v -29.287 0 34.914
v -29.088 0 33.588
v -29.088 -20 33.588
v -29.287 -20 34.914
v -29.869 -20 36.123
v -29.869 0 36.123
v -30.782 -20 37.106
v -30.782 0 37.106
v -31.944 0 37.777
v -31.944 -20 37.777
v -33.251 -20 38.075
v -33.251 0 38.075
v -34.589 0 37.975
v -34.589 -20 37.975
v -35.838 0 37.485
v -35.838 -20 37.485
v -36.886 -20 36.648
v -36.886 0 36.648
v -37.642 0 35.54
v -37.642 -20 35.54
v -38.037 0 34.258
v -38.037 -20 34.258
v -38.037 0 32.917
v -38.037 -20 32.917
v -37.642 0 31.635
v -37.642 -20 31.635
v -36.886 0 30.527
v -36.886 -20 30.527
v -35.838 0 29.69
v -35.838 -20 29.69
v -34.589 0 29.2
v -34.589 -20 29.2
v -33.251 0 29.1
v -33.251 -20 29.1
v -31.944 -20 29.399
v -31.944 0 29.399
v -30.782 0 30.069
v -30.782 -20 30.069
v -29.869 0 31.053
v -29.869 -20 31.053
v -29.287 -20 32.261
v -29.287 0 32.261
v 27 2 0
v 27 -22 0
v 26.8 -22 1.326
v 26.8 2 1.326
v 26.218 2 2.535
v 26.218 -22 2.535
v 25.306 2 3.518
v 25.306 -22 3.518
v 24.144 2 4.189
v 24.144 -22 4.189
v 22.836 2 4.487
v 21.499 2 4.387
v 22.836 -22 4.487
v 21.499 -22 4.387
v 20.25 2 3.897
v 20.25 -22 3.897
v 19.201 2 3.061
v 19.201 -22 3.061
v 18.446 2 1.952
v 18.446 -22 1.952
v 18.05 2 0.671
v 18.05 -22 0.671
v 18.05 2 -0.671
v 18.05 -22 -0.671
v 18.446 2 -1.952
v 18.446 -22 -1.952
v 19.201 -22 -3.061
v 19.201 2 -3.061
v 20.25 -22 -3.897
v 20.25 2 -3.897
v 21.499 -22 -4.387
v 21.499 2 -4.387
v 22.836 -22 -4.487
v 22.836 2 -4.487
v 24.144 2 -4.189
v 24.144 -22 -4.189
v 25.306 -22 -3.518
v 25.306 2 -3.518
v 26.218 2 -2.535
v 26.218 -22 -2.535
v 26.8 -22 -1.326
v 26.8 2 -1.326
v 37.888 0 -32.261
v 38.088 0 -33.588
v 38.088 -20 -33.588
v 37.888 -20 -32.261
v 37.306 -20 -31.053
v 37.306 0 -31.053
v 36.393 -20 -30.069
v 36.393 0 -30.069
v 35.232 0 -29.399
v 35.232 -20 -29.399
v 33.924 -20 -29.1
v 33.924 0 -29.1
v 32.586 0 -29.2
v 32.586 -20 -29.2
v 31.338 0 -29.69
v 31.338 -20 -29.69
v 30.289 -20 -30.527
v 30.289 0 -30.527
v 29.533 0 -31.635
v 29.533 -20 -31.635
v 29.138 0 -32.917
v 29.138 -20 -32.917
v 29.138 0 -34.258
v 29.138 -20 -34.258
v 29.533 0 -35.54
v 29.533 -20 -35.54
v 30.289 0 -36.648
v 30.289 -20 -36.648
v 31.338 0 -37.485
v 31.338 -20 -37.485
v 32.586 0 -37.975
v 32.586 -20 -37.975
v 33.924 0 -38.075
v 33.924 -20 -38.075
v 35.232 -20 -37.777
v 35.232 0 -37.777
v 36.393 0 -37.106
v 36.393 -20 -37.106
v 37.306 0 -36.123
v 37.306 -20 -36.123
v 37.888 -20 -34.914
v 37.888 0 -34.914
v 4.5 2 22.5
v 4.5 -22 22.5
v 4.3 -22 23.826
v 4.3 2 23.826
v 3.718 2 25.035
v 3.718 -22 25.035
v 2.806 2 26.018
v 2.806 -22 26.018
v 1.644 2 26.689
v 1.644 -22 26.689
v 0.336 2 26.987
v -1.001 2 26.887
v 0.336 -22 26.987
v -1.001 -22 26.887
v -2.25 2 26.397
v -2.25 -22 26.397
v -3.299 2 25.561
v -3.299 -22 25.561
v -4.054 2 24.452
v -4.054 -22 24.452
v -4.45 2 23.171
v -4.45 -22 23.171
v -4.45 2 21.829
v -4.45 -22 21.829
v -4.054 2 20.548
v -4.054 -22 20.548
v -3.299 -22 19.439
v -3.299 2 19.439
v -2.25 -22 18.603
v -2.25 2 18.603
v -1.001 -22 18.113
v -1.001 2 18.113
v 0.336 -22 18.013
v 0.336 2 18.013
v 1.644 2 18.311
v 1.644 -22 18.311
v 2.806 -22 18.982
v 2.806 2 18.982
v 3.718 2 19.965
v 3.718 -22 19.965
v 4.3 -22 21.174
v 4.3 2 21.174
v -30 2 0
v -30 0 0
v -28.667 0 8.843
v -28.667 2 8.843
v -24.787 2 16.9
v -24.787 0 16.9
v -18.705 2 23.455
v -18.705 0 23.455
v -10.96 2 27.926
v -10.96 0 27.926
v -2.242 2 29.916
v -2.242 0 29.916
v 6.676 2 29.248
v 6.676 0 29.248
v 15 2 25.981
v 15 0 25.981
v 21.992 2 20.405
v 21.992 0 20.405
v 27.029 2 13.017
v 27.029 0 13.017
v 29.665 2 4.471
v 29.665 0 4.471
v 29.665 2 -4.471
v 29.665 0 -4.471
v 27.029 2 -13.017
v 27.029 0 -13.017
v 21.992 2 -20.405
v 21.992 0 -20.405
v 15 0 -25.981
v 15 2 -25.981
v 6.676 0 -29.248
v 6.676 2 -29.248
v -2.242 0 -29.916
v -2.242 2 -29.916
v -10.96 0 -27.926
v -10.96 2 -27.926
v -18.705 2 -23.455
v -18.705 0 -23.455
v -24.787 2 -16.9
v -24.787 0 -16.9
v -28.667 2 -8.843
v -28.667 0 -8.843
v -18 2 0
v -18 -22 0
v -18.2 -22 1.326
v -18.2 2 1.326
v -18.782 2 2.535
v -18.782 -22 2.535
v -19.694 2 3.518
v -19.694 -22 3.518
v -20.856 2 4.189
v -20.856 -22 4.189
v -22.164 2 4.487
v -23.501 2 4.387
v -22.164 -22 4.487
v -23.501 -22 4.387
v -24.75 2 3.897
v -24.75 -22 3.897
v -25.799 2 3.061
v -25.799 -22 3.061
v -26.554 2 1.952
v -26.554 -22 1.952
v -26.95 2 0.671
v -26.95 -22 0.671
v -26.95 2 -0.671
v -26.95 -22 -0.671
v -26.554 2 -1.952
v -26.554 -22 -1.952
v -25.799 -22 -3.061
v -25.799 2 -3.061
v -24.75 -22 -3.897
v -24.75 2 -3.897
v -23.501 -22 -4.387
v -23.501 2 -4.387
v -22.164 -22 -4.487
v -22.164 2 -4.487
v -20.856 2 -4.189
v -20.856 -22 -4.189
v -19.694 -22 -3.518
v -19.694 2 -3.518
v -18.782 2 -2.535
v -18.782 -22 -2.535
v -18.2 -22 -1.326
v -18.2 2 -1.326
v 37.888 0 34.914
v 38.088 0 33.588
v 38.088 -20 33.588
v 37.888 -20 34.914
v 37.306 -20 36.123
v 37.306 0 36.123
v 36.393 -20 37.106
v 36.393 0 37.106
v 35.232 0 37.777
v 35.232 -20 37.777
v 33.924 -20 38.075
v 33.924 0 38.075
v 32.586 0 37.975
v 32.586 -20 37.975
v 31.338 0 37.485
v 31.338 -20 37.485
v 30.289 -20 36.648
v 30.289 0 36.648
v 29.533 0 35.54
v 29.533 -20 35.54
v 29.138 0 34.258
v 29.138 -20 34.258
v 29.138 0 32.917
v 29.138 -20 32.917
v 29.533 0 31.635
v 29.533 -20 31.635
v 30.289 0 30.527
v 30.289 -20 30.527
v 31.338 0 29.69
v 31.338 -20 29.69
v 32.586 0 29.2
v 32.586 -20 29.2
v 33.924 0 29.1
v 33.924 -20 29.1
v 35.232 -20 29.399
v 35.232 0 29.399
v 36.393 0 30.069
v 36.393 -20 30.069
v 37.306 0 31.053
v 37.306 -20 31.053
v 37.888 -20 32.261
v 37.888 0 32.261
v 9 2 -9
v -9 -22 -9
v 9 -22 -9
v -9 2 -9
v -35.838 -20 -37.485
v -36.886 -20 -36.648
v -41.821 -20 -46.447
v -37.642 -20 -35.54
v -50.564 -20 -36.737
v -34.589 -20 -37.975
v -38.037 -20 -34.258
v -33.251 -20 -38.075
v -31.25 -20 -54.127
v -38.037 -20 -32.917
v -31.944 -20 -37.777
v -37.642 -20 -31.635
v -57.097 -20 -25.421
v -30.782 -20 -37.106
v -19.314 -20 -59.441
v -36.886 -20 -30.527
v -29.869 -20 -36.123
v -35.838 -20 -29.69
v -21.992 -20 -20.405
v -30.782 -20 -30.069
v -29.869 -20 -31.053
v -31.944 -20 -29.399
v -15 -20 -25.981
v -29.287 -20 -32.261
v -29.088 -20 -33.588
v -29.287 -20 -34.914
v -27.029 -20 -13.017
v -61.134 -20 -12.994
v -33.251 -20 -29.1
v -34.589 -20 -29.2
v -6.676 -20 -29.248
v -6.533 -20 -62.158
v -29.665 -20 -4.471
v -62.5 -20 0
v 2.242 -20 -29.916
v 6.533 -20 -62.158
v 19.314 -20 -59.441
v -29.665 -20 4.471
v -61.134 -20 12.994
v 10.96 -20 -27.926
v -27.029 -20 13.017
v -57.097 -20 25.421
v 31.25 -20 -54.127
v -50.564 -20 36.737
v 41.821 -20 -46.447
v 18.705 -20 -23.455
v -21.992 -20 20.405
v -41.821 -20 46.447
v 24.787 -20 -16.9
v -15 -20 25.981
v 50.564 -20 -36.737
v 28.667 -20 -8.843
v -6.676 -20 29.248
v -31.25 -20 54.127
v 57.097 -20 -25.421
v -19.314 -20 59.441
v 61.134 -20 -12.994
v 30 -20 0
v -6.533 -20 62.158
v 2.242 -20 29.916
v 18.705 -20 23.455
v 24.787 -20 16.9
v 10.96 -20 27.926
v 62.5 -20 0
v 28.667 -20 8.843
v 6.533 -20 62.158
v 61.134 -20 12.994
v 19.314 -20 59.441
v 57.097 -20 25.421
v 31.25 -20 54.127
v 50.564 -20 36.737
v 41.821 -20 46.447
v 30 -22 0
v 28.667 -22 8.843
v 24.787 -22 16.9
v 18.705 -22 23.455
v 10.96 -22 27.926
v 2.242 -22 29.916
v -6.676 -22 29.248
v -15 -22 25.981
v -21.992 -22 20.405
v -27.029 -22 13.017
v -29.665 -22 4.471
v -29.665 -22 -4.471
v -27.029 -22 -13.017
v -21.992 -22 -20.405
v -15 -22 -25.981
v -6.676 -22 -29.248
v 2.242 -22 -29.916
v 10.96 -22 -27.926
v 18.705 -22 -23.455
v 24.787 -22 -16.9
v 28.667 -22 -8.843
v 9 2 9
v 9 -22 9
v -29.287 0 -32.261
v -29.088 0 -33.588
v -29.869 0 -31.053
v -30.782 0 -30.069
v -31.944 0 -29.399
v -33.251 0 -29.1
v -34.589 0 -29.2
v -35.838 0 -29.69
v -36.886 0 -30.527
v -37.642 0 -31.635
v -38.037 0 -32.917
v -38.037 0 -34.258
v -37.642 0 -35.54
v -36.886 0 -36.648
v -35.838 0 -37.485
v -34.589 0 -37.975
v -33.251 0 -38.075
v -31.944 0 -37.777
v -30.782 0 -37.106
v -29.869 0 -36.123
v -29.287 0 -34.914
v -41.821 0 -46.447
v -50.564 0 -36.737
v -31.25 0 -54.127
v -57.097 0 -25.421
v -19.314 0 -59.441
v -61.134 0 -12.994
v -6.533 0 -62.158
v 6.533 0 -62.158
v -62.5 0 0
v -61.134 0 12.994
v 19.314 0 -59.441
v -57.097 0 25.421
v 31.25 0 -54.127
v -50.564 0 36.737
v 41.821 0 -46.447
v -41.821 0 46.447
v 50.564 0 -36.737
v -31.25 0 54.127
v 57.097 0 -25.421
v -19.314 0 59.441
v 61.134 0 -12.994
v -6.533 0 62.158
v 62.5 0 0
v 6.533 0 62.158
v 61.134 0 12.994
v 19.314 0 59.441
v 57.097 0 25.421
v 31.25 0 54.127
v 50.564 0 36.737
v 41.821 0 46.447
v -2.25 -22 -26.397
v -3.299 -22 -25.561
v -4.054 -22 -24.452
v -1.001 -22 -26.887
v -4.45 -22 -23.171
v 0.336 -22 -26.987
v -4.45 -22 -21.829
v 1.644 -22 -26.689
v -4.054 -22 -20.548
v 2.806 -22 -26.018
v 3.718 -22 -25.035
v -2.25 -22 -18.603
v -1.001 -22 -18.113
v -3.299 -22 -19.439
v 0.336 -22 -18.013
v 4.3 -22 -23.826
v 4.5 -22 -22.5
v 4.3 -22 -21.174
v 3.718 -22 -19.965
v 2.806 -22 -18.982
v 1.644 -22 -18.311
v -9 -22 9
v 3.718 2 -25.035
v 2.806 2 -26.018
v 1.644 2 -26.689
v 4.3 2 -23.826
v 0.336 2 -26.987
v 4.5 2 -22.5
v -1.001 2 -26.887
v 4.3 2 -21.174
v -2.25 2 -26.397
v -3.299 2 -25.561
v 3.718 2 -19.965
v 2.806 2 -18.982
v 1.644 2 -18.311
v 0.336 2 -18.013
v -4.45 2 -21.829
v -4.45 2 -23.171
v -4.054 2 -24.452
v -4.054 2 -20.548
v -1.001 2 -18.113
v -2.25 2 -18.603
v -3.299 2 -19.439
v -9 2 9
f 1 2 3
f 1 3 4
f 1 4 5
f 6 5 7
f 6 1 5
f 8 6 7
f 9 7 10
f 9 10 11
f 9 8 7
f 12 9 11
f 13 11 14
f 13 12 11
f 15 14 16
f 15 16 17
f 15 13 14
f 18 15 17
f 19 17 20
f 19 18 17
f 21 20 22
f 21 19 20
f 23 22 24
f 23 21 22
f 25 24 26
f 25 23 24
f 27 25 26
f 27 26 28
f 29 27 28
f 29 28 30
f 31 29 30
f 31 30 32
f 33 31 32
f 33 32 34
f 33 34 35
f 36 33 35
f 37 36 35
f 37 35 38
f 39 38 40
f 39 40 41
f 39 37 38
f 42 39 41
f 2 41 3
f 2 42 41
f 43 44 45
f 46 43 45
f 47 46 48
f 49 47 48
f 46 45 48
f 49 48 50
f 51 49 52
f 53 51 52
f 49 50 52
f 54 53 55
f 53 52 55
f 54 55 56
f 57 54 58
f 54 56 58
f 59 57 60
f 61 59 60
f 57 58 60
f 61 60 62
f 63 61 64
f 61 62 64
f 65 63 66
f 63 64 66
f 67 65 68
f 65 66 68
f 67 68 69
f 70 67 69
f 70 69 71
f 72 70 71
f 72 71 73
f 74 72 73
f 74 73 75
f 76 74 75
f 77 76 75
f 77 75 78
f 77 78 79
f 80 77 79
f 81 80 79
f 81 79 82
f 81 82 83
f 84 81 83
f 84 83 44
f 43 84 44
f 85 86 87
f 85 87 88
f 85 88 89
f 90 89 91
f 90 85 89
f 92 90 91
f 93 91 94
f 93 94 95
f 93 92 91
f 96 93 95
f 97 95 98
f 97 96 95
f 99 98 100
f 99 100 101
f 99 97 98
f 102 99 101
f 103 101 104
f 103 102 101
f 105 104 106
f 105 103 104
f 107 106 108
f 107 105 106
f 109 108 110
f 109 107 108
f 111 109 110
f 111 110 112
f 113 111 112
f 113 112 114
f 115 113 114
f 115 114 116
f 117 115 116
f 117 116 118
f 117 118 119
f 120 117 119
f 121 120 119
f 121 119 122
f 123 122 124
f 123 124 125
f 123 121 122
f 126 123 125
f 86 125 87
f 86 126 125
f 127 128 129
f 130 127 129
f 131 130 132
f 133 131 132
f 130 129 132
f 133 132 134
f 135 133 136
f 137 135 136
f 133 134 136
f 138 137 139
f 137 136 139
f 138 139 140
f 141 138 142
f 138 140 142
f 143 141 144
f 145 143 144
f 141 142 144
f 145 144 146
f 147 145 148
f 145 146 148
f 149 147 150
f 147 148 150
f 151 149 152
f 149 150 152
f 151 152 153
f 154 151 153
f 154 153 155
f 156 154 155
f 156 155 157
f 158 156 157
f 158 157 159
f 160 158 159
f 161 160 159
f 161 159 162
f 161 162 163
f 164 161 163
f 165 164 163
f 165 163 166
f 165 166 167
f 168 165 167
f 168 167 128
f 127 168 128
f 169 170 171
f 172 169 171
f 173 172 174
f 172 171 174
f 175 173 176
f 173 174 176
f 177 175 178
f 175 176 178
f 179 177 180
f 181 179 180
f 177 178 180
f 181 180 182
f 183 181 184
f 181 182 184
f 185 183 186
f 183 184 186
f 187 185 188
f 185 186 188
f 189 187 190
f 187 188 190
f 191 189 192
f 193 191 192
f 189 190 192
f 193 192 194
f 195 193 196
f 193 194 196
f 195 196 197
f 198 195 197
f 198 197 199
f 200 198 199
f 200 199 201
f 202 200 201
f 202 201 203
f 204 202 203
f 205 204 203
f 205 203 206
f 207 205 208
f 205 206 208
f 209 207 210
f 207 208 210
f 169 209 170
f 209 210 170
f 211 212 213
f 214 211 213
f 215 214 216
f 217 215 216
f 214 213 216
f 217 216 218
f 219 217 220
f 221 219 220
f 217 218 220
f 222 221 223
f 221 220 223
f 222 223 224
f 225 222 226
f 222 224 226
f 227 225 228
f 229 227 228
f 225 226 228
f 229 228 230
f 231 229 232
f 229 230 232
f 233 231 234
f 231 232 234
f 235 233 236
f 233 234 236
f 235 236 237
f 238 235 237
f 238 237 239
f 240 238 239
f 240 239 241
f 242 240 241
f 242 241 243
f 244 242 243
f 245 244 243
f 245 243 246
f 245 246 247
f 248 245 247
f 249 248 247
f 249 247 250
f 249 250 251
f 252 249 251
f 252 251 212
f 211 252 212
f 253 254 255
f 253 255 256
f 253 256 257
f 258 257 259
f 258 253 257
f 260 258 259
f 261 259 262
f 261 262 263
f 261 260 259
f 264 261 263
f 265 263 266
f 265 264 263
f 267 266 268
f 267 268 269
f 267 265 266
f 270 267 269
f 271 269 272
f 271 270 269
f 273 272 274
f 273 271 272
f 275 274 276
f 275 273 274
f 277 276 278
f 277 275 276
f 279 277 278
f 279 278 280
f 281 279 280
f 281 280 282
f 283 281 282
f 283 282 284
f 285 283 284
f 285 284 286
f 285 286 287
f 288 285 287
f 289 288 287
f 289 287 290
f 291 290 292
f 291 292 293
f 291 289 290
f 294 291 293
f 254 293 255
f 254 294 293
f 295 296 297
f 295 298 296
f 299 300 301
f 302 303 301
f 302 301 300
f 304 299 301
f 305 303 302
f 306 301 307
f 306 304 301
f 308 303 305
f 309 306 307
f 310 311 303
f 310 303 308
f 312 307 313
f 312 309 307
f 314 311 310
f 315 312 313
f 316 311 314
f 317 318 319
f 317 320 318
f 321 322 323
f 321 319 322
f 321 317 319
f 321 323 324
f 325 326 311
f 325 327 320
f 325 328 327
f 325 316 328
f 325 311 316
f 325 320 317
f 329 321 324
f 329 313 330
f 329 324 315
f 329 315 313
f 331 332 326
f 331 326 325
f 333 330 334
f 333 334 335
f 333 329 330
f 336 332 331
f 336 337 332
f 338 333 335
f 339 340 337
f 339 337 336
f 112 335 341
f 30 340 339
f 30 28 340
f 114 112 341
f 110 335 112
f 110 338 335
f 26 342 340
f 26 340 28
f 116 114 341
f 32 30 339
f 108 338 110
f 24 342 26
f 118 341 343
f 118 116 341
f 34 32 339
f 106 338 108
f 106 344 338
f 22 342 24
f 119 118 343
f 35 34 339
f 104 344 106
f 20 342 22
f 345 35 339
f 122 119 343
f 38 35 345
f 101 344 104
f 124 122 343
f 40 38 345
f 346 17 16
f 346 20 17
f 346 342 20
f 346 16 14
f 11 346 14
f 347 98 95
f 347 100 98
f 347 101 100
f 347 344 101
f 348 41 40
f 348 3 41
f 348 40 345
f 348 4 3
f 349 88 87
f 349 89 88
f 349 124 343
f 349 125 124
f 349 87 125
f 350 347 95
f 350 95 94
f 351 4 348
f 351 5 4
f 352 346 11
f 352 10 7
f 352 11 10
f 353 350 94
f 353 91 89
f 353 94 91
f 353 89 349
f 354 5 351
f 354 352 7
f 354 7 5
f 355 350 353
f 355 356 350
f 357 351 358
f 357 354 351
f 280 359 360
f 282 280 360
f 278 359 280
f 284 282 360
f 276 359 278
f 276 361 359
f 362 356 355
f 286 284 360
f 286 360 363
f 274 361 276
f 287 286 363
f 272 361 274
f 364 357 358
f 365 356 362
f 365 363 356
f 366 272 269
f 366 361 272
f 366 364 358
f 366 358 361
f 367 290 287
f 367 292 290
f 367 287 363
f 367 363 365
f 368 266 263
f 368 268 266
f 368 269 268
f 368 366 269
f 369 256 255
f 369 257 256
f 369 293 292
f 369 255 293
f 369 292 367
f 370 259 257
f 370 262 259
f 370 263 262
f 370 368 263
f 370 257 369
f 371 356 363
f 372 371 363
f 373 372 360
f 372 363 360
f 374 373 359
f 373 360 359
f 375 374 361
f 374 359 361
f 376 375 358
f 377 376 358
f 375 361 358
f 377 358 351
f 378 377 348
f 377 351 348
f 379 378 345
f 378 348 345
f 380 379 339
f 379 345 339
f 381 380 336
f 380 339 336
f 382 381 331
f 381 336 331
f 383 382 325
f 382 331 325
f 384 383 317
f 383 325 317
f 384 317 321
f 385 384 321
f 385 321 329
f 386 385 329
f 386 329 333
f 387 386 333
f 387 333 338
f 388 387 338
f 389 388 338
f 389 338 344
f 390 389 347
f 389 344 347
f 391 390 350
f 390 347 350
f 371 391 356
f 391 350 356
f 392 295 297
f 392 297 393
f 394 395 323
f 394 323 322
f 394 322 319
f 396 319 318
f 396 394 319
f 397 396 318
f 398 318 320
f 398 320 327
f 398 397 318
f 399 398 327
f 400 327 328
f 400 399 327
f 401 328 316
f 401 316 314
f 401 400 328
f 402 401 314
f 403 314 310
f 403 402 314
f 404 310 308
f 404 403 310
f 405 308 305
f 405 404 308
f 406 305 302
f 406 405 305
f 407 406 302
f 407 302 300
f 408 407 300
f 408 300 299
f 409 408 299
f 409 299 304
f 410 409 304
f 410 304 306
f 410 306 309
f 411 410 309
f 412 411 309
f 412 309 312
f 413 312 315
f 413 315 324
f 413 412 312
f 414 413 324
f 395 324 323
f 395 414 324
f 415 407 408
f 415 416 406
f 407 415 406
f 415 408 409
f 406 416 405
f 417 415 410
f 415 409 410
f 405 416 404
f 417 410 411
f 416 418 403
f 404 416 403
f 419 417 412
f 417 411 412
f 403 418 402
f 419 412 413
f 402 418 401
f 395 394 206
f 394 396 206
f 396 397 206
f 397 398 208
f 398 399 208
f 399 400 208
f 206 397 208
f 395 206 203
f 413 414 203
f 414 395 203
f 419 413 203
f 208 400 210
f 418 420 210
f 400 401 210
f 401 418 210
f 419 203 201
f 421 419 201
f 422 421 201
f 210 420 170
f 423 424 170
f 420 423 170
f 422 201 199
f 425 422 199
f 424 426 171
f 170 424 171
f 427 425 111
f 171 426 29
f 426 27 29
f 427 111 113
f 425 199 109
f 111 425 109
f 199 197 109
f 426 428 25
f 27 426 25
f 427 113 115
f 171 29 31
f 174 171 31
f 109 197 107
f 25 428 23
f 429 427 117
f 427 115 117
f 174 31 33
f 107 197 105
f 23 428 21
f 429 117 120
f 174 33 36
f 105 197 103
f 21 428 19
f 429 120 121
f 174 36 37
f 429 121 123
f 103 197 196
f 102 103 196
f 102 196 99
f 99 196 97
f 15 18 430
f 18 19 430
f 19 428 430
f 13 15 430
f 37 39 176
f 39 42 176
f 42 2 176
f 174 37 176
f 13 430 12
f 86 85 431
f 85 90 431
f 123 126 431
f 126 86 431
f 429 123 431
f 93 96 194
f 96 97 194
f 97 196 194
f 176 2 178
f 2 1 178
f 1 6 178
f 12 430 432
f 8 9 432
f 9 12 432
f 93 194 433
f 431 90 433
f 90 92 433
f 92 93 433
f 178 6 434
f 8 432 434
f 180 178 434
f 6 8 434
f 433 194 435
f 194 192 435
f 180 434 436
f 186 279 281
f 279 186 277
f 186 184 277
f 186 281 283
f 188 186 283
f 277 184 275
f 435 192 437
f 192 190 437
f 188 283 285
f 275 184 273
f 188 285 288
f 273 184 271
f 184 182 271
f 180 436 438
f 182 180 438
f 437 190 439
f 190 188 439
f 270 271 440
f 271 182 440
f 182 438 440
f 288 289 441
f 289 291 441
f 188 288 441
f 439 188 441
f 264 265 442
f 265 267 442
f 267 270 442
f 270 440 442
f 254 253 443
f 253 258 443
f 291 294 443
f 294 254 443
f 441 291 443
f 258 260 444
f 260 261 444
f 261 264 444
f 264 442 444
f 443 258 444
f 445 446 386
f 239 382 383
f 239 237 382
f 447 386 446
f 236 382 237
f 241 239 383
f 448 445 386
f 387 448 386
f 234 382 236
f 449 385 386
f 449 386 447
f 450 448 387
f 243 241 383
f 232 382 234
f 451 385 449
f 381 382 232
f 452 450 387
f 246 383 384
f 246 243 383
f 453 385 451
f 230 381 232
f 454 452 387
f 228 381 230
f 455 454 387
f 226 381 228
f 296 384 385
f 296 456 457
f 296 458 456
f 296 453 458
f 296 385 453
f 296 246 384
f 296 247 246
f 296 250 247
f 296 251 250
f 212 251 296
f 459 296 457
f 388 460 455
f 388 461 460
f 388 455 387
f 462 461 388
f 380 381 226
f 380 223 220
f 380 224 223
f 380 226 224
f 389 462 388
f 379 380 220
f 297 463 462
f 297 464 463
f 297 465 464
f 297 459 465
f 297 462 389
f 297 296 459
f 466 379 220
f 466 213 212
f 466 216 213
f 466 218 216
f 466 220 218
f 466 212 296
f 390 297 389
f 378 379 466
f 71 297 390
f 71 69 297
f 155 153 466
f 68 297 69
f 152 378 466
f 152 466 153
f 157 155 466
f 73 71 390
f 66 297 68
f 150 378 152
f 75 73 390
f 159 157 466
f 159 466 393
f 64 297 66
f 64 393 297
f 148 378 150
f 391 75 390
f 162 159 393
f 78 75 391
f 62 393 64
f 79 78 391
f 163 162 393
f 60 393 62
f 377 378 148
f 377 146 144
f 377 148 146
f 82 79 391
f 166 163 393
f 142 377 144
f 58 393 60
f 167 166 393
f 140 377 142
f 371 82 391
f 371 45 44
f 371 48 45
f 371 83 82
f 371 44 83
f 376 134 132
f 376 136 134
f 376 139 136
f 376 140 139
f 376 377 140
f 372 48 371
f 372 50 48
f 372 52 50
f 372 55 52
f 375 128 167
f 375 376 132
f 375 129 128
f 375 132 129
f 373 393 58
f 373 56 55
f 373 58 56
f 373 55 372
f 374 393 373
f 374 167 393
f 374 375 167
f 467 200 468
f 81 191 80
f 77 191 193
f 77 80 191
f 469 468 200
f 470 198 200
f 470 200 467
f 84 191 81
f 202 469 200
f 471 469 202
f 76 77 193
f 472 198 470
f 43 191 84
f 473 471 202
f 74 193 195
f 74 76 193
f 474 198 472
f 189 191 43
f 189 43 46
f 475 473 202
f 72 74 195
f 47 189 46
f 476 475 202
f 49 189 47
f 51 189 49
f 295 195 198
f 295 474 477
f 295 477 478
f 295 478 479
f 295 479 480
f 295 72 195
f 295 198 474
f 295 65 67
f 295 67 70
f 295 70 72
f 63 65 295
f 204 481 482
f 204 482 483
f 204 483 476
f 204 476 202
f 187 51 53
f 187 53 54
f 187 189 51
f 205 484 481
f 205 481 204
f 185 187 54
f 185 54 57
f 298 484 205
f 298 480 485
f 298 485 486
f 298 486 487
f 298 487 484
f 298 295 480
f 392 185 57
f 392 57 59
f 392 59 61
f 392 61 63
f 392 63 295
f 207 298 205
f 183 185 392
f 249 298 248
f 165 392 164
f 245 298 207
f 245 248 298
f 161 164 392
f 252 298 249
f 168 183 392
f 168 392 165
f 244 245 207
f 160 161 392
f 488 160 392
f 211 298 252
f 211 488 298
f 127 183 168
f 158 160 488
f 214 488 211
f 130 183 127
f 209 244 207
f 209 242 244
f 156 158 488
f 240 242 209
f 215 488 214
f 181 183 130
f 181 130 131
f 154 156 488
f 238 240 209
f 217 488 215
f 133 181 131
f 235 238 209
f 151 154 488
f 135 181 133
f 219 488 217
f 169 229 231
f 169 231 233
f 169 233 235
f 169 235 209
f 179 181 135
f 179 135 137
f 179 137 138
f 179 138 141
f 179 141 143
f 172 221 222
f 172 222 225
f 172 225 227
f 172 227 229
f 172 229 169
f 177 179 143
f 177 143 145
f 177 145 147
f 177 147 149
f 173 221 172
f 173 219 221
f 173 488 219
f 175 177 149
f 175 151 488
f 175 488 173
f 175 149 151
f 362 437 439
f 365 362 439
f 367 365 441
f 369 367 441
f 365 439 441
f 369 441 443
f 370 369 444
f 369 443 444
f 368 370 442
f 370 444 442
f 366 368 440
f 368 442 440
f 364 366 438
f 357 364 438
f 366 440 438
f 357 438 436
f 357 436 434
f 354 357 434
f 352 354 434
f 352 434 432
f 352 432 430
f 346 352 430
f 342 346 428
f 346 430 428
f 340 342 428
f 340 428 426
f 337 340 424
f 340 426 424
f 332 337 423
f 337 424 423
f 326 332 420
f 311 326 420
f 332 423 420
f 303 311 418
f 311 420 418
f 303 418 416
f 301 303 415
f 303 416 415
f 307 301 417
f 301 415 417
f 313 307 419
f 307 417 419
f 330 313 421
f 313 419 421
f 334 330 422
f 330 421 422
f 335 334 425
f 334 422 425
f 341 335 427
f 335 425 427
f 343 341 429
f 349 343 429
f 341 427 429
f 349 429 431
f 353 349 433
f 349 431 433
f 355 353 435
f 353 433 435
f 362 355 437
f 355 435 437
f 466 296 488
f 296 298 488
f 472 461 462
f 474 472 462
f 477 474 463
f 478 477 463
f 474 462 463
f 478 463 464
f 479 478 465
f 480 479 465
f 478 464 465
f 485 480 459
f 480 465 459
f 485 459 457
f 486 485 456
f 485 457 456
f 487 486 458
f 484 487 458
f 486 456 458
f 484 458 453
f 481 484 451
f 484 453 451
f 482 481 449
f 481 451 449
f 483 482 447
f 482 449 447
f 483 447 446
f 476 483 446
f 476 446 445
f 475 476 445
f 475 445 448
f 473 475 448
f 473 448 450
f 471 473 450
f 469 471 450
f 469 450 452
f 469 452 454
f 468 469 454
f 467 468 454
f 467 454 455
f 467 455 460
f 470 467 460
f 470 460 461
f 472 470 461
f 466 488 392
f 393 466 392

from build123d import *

# Parameters (mm, degrees)
F0_R     = 62.5
F0_R_2   = 4.5
F0_W     = 18
F0_H     = 18
F1_DEPTH = 20
F2_R     = 30
F2_W     = 18
F2_H     = 18
F3_DEPTH = 2
F4_R     = 30
F4_W     = 18
F4_H     = 18
F5_DEPTH = 2
F6_R     = 4.5
F7_DEPTH = 30


with BuildPart() as f1:
    # F0 (on Front) → F1 (new body)
    with BuildSketch(Plane.XZ):
        Circle(F0_R)
        with Locations((-33.587572, -33.587572)):
            Circle(F0_R_2, mode=Mode.SUBTRACT)
        with Locations((33.587572, -33.587572)):
            Circle(F0_R_2, mode=Mode.SUBTRACT)
        with Locations((-33.587572, 33.587572)):
            Circle(F0_R_2, mode=Mode.SUBTRACT)
        Rectangle(F0_W, F0_H, mode=Mode.SUBTRACT)
        with Locations((33.587572, 33.587572)):
            Circle(F0_R_2, mode=Mode.SUBTRACT)
    extrude(amount=F1_DEPTH)

    # F2 (on face) → F3 (join)
    with BuildSketch(Plane(origin=(0, 0, 0), x_dir=(-1, 0, 0), z_dir=(0, 1, 0))):
        Circle(F2_R)
        Rectangle(F2_W, F2_H, mode=Mode.SUBTRACT)
    extrude(amount=F3_DEPTH)

    # F4 (on face) → F5 (join)
    with BuildSketch(Plane.XZ.offset(20)):
        Circle(F4_R)
        Rectangle(F4_W, F4_H, mode=Mode.SUBTRACT)
    extrude(amount=F5_DEPTH)

    # F6 (on face) → F7 (cut)
    with BuildSketch(Plane.XZ.offset(22)):
        with Locations((0, 22.5)):
            Circle(F6_R)
        with Locations((22.5, 0)):
            Circle(F6_R)
        with Locations((0, -22.5)):
            Circle(F6_R)
        with Locations((-22.5, 0)):
            Circle(F6_R)
    extrude(amount=-F7_DEPTH, mode=Mode.SUBTRACT)


solid = f1.part
